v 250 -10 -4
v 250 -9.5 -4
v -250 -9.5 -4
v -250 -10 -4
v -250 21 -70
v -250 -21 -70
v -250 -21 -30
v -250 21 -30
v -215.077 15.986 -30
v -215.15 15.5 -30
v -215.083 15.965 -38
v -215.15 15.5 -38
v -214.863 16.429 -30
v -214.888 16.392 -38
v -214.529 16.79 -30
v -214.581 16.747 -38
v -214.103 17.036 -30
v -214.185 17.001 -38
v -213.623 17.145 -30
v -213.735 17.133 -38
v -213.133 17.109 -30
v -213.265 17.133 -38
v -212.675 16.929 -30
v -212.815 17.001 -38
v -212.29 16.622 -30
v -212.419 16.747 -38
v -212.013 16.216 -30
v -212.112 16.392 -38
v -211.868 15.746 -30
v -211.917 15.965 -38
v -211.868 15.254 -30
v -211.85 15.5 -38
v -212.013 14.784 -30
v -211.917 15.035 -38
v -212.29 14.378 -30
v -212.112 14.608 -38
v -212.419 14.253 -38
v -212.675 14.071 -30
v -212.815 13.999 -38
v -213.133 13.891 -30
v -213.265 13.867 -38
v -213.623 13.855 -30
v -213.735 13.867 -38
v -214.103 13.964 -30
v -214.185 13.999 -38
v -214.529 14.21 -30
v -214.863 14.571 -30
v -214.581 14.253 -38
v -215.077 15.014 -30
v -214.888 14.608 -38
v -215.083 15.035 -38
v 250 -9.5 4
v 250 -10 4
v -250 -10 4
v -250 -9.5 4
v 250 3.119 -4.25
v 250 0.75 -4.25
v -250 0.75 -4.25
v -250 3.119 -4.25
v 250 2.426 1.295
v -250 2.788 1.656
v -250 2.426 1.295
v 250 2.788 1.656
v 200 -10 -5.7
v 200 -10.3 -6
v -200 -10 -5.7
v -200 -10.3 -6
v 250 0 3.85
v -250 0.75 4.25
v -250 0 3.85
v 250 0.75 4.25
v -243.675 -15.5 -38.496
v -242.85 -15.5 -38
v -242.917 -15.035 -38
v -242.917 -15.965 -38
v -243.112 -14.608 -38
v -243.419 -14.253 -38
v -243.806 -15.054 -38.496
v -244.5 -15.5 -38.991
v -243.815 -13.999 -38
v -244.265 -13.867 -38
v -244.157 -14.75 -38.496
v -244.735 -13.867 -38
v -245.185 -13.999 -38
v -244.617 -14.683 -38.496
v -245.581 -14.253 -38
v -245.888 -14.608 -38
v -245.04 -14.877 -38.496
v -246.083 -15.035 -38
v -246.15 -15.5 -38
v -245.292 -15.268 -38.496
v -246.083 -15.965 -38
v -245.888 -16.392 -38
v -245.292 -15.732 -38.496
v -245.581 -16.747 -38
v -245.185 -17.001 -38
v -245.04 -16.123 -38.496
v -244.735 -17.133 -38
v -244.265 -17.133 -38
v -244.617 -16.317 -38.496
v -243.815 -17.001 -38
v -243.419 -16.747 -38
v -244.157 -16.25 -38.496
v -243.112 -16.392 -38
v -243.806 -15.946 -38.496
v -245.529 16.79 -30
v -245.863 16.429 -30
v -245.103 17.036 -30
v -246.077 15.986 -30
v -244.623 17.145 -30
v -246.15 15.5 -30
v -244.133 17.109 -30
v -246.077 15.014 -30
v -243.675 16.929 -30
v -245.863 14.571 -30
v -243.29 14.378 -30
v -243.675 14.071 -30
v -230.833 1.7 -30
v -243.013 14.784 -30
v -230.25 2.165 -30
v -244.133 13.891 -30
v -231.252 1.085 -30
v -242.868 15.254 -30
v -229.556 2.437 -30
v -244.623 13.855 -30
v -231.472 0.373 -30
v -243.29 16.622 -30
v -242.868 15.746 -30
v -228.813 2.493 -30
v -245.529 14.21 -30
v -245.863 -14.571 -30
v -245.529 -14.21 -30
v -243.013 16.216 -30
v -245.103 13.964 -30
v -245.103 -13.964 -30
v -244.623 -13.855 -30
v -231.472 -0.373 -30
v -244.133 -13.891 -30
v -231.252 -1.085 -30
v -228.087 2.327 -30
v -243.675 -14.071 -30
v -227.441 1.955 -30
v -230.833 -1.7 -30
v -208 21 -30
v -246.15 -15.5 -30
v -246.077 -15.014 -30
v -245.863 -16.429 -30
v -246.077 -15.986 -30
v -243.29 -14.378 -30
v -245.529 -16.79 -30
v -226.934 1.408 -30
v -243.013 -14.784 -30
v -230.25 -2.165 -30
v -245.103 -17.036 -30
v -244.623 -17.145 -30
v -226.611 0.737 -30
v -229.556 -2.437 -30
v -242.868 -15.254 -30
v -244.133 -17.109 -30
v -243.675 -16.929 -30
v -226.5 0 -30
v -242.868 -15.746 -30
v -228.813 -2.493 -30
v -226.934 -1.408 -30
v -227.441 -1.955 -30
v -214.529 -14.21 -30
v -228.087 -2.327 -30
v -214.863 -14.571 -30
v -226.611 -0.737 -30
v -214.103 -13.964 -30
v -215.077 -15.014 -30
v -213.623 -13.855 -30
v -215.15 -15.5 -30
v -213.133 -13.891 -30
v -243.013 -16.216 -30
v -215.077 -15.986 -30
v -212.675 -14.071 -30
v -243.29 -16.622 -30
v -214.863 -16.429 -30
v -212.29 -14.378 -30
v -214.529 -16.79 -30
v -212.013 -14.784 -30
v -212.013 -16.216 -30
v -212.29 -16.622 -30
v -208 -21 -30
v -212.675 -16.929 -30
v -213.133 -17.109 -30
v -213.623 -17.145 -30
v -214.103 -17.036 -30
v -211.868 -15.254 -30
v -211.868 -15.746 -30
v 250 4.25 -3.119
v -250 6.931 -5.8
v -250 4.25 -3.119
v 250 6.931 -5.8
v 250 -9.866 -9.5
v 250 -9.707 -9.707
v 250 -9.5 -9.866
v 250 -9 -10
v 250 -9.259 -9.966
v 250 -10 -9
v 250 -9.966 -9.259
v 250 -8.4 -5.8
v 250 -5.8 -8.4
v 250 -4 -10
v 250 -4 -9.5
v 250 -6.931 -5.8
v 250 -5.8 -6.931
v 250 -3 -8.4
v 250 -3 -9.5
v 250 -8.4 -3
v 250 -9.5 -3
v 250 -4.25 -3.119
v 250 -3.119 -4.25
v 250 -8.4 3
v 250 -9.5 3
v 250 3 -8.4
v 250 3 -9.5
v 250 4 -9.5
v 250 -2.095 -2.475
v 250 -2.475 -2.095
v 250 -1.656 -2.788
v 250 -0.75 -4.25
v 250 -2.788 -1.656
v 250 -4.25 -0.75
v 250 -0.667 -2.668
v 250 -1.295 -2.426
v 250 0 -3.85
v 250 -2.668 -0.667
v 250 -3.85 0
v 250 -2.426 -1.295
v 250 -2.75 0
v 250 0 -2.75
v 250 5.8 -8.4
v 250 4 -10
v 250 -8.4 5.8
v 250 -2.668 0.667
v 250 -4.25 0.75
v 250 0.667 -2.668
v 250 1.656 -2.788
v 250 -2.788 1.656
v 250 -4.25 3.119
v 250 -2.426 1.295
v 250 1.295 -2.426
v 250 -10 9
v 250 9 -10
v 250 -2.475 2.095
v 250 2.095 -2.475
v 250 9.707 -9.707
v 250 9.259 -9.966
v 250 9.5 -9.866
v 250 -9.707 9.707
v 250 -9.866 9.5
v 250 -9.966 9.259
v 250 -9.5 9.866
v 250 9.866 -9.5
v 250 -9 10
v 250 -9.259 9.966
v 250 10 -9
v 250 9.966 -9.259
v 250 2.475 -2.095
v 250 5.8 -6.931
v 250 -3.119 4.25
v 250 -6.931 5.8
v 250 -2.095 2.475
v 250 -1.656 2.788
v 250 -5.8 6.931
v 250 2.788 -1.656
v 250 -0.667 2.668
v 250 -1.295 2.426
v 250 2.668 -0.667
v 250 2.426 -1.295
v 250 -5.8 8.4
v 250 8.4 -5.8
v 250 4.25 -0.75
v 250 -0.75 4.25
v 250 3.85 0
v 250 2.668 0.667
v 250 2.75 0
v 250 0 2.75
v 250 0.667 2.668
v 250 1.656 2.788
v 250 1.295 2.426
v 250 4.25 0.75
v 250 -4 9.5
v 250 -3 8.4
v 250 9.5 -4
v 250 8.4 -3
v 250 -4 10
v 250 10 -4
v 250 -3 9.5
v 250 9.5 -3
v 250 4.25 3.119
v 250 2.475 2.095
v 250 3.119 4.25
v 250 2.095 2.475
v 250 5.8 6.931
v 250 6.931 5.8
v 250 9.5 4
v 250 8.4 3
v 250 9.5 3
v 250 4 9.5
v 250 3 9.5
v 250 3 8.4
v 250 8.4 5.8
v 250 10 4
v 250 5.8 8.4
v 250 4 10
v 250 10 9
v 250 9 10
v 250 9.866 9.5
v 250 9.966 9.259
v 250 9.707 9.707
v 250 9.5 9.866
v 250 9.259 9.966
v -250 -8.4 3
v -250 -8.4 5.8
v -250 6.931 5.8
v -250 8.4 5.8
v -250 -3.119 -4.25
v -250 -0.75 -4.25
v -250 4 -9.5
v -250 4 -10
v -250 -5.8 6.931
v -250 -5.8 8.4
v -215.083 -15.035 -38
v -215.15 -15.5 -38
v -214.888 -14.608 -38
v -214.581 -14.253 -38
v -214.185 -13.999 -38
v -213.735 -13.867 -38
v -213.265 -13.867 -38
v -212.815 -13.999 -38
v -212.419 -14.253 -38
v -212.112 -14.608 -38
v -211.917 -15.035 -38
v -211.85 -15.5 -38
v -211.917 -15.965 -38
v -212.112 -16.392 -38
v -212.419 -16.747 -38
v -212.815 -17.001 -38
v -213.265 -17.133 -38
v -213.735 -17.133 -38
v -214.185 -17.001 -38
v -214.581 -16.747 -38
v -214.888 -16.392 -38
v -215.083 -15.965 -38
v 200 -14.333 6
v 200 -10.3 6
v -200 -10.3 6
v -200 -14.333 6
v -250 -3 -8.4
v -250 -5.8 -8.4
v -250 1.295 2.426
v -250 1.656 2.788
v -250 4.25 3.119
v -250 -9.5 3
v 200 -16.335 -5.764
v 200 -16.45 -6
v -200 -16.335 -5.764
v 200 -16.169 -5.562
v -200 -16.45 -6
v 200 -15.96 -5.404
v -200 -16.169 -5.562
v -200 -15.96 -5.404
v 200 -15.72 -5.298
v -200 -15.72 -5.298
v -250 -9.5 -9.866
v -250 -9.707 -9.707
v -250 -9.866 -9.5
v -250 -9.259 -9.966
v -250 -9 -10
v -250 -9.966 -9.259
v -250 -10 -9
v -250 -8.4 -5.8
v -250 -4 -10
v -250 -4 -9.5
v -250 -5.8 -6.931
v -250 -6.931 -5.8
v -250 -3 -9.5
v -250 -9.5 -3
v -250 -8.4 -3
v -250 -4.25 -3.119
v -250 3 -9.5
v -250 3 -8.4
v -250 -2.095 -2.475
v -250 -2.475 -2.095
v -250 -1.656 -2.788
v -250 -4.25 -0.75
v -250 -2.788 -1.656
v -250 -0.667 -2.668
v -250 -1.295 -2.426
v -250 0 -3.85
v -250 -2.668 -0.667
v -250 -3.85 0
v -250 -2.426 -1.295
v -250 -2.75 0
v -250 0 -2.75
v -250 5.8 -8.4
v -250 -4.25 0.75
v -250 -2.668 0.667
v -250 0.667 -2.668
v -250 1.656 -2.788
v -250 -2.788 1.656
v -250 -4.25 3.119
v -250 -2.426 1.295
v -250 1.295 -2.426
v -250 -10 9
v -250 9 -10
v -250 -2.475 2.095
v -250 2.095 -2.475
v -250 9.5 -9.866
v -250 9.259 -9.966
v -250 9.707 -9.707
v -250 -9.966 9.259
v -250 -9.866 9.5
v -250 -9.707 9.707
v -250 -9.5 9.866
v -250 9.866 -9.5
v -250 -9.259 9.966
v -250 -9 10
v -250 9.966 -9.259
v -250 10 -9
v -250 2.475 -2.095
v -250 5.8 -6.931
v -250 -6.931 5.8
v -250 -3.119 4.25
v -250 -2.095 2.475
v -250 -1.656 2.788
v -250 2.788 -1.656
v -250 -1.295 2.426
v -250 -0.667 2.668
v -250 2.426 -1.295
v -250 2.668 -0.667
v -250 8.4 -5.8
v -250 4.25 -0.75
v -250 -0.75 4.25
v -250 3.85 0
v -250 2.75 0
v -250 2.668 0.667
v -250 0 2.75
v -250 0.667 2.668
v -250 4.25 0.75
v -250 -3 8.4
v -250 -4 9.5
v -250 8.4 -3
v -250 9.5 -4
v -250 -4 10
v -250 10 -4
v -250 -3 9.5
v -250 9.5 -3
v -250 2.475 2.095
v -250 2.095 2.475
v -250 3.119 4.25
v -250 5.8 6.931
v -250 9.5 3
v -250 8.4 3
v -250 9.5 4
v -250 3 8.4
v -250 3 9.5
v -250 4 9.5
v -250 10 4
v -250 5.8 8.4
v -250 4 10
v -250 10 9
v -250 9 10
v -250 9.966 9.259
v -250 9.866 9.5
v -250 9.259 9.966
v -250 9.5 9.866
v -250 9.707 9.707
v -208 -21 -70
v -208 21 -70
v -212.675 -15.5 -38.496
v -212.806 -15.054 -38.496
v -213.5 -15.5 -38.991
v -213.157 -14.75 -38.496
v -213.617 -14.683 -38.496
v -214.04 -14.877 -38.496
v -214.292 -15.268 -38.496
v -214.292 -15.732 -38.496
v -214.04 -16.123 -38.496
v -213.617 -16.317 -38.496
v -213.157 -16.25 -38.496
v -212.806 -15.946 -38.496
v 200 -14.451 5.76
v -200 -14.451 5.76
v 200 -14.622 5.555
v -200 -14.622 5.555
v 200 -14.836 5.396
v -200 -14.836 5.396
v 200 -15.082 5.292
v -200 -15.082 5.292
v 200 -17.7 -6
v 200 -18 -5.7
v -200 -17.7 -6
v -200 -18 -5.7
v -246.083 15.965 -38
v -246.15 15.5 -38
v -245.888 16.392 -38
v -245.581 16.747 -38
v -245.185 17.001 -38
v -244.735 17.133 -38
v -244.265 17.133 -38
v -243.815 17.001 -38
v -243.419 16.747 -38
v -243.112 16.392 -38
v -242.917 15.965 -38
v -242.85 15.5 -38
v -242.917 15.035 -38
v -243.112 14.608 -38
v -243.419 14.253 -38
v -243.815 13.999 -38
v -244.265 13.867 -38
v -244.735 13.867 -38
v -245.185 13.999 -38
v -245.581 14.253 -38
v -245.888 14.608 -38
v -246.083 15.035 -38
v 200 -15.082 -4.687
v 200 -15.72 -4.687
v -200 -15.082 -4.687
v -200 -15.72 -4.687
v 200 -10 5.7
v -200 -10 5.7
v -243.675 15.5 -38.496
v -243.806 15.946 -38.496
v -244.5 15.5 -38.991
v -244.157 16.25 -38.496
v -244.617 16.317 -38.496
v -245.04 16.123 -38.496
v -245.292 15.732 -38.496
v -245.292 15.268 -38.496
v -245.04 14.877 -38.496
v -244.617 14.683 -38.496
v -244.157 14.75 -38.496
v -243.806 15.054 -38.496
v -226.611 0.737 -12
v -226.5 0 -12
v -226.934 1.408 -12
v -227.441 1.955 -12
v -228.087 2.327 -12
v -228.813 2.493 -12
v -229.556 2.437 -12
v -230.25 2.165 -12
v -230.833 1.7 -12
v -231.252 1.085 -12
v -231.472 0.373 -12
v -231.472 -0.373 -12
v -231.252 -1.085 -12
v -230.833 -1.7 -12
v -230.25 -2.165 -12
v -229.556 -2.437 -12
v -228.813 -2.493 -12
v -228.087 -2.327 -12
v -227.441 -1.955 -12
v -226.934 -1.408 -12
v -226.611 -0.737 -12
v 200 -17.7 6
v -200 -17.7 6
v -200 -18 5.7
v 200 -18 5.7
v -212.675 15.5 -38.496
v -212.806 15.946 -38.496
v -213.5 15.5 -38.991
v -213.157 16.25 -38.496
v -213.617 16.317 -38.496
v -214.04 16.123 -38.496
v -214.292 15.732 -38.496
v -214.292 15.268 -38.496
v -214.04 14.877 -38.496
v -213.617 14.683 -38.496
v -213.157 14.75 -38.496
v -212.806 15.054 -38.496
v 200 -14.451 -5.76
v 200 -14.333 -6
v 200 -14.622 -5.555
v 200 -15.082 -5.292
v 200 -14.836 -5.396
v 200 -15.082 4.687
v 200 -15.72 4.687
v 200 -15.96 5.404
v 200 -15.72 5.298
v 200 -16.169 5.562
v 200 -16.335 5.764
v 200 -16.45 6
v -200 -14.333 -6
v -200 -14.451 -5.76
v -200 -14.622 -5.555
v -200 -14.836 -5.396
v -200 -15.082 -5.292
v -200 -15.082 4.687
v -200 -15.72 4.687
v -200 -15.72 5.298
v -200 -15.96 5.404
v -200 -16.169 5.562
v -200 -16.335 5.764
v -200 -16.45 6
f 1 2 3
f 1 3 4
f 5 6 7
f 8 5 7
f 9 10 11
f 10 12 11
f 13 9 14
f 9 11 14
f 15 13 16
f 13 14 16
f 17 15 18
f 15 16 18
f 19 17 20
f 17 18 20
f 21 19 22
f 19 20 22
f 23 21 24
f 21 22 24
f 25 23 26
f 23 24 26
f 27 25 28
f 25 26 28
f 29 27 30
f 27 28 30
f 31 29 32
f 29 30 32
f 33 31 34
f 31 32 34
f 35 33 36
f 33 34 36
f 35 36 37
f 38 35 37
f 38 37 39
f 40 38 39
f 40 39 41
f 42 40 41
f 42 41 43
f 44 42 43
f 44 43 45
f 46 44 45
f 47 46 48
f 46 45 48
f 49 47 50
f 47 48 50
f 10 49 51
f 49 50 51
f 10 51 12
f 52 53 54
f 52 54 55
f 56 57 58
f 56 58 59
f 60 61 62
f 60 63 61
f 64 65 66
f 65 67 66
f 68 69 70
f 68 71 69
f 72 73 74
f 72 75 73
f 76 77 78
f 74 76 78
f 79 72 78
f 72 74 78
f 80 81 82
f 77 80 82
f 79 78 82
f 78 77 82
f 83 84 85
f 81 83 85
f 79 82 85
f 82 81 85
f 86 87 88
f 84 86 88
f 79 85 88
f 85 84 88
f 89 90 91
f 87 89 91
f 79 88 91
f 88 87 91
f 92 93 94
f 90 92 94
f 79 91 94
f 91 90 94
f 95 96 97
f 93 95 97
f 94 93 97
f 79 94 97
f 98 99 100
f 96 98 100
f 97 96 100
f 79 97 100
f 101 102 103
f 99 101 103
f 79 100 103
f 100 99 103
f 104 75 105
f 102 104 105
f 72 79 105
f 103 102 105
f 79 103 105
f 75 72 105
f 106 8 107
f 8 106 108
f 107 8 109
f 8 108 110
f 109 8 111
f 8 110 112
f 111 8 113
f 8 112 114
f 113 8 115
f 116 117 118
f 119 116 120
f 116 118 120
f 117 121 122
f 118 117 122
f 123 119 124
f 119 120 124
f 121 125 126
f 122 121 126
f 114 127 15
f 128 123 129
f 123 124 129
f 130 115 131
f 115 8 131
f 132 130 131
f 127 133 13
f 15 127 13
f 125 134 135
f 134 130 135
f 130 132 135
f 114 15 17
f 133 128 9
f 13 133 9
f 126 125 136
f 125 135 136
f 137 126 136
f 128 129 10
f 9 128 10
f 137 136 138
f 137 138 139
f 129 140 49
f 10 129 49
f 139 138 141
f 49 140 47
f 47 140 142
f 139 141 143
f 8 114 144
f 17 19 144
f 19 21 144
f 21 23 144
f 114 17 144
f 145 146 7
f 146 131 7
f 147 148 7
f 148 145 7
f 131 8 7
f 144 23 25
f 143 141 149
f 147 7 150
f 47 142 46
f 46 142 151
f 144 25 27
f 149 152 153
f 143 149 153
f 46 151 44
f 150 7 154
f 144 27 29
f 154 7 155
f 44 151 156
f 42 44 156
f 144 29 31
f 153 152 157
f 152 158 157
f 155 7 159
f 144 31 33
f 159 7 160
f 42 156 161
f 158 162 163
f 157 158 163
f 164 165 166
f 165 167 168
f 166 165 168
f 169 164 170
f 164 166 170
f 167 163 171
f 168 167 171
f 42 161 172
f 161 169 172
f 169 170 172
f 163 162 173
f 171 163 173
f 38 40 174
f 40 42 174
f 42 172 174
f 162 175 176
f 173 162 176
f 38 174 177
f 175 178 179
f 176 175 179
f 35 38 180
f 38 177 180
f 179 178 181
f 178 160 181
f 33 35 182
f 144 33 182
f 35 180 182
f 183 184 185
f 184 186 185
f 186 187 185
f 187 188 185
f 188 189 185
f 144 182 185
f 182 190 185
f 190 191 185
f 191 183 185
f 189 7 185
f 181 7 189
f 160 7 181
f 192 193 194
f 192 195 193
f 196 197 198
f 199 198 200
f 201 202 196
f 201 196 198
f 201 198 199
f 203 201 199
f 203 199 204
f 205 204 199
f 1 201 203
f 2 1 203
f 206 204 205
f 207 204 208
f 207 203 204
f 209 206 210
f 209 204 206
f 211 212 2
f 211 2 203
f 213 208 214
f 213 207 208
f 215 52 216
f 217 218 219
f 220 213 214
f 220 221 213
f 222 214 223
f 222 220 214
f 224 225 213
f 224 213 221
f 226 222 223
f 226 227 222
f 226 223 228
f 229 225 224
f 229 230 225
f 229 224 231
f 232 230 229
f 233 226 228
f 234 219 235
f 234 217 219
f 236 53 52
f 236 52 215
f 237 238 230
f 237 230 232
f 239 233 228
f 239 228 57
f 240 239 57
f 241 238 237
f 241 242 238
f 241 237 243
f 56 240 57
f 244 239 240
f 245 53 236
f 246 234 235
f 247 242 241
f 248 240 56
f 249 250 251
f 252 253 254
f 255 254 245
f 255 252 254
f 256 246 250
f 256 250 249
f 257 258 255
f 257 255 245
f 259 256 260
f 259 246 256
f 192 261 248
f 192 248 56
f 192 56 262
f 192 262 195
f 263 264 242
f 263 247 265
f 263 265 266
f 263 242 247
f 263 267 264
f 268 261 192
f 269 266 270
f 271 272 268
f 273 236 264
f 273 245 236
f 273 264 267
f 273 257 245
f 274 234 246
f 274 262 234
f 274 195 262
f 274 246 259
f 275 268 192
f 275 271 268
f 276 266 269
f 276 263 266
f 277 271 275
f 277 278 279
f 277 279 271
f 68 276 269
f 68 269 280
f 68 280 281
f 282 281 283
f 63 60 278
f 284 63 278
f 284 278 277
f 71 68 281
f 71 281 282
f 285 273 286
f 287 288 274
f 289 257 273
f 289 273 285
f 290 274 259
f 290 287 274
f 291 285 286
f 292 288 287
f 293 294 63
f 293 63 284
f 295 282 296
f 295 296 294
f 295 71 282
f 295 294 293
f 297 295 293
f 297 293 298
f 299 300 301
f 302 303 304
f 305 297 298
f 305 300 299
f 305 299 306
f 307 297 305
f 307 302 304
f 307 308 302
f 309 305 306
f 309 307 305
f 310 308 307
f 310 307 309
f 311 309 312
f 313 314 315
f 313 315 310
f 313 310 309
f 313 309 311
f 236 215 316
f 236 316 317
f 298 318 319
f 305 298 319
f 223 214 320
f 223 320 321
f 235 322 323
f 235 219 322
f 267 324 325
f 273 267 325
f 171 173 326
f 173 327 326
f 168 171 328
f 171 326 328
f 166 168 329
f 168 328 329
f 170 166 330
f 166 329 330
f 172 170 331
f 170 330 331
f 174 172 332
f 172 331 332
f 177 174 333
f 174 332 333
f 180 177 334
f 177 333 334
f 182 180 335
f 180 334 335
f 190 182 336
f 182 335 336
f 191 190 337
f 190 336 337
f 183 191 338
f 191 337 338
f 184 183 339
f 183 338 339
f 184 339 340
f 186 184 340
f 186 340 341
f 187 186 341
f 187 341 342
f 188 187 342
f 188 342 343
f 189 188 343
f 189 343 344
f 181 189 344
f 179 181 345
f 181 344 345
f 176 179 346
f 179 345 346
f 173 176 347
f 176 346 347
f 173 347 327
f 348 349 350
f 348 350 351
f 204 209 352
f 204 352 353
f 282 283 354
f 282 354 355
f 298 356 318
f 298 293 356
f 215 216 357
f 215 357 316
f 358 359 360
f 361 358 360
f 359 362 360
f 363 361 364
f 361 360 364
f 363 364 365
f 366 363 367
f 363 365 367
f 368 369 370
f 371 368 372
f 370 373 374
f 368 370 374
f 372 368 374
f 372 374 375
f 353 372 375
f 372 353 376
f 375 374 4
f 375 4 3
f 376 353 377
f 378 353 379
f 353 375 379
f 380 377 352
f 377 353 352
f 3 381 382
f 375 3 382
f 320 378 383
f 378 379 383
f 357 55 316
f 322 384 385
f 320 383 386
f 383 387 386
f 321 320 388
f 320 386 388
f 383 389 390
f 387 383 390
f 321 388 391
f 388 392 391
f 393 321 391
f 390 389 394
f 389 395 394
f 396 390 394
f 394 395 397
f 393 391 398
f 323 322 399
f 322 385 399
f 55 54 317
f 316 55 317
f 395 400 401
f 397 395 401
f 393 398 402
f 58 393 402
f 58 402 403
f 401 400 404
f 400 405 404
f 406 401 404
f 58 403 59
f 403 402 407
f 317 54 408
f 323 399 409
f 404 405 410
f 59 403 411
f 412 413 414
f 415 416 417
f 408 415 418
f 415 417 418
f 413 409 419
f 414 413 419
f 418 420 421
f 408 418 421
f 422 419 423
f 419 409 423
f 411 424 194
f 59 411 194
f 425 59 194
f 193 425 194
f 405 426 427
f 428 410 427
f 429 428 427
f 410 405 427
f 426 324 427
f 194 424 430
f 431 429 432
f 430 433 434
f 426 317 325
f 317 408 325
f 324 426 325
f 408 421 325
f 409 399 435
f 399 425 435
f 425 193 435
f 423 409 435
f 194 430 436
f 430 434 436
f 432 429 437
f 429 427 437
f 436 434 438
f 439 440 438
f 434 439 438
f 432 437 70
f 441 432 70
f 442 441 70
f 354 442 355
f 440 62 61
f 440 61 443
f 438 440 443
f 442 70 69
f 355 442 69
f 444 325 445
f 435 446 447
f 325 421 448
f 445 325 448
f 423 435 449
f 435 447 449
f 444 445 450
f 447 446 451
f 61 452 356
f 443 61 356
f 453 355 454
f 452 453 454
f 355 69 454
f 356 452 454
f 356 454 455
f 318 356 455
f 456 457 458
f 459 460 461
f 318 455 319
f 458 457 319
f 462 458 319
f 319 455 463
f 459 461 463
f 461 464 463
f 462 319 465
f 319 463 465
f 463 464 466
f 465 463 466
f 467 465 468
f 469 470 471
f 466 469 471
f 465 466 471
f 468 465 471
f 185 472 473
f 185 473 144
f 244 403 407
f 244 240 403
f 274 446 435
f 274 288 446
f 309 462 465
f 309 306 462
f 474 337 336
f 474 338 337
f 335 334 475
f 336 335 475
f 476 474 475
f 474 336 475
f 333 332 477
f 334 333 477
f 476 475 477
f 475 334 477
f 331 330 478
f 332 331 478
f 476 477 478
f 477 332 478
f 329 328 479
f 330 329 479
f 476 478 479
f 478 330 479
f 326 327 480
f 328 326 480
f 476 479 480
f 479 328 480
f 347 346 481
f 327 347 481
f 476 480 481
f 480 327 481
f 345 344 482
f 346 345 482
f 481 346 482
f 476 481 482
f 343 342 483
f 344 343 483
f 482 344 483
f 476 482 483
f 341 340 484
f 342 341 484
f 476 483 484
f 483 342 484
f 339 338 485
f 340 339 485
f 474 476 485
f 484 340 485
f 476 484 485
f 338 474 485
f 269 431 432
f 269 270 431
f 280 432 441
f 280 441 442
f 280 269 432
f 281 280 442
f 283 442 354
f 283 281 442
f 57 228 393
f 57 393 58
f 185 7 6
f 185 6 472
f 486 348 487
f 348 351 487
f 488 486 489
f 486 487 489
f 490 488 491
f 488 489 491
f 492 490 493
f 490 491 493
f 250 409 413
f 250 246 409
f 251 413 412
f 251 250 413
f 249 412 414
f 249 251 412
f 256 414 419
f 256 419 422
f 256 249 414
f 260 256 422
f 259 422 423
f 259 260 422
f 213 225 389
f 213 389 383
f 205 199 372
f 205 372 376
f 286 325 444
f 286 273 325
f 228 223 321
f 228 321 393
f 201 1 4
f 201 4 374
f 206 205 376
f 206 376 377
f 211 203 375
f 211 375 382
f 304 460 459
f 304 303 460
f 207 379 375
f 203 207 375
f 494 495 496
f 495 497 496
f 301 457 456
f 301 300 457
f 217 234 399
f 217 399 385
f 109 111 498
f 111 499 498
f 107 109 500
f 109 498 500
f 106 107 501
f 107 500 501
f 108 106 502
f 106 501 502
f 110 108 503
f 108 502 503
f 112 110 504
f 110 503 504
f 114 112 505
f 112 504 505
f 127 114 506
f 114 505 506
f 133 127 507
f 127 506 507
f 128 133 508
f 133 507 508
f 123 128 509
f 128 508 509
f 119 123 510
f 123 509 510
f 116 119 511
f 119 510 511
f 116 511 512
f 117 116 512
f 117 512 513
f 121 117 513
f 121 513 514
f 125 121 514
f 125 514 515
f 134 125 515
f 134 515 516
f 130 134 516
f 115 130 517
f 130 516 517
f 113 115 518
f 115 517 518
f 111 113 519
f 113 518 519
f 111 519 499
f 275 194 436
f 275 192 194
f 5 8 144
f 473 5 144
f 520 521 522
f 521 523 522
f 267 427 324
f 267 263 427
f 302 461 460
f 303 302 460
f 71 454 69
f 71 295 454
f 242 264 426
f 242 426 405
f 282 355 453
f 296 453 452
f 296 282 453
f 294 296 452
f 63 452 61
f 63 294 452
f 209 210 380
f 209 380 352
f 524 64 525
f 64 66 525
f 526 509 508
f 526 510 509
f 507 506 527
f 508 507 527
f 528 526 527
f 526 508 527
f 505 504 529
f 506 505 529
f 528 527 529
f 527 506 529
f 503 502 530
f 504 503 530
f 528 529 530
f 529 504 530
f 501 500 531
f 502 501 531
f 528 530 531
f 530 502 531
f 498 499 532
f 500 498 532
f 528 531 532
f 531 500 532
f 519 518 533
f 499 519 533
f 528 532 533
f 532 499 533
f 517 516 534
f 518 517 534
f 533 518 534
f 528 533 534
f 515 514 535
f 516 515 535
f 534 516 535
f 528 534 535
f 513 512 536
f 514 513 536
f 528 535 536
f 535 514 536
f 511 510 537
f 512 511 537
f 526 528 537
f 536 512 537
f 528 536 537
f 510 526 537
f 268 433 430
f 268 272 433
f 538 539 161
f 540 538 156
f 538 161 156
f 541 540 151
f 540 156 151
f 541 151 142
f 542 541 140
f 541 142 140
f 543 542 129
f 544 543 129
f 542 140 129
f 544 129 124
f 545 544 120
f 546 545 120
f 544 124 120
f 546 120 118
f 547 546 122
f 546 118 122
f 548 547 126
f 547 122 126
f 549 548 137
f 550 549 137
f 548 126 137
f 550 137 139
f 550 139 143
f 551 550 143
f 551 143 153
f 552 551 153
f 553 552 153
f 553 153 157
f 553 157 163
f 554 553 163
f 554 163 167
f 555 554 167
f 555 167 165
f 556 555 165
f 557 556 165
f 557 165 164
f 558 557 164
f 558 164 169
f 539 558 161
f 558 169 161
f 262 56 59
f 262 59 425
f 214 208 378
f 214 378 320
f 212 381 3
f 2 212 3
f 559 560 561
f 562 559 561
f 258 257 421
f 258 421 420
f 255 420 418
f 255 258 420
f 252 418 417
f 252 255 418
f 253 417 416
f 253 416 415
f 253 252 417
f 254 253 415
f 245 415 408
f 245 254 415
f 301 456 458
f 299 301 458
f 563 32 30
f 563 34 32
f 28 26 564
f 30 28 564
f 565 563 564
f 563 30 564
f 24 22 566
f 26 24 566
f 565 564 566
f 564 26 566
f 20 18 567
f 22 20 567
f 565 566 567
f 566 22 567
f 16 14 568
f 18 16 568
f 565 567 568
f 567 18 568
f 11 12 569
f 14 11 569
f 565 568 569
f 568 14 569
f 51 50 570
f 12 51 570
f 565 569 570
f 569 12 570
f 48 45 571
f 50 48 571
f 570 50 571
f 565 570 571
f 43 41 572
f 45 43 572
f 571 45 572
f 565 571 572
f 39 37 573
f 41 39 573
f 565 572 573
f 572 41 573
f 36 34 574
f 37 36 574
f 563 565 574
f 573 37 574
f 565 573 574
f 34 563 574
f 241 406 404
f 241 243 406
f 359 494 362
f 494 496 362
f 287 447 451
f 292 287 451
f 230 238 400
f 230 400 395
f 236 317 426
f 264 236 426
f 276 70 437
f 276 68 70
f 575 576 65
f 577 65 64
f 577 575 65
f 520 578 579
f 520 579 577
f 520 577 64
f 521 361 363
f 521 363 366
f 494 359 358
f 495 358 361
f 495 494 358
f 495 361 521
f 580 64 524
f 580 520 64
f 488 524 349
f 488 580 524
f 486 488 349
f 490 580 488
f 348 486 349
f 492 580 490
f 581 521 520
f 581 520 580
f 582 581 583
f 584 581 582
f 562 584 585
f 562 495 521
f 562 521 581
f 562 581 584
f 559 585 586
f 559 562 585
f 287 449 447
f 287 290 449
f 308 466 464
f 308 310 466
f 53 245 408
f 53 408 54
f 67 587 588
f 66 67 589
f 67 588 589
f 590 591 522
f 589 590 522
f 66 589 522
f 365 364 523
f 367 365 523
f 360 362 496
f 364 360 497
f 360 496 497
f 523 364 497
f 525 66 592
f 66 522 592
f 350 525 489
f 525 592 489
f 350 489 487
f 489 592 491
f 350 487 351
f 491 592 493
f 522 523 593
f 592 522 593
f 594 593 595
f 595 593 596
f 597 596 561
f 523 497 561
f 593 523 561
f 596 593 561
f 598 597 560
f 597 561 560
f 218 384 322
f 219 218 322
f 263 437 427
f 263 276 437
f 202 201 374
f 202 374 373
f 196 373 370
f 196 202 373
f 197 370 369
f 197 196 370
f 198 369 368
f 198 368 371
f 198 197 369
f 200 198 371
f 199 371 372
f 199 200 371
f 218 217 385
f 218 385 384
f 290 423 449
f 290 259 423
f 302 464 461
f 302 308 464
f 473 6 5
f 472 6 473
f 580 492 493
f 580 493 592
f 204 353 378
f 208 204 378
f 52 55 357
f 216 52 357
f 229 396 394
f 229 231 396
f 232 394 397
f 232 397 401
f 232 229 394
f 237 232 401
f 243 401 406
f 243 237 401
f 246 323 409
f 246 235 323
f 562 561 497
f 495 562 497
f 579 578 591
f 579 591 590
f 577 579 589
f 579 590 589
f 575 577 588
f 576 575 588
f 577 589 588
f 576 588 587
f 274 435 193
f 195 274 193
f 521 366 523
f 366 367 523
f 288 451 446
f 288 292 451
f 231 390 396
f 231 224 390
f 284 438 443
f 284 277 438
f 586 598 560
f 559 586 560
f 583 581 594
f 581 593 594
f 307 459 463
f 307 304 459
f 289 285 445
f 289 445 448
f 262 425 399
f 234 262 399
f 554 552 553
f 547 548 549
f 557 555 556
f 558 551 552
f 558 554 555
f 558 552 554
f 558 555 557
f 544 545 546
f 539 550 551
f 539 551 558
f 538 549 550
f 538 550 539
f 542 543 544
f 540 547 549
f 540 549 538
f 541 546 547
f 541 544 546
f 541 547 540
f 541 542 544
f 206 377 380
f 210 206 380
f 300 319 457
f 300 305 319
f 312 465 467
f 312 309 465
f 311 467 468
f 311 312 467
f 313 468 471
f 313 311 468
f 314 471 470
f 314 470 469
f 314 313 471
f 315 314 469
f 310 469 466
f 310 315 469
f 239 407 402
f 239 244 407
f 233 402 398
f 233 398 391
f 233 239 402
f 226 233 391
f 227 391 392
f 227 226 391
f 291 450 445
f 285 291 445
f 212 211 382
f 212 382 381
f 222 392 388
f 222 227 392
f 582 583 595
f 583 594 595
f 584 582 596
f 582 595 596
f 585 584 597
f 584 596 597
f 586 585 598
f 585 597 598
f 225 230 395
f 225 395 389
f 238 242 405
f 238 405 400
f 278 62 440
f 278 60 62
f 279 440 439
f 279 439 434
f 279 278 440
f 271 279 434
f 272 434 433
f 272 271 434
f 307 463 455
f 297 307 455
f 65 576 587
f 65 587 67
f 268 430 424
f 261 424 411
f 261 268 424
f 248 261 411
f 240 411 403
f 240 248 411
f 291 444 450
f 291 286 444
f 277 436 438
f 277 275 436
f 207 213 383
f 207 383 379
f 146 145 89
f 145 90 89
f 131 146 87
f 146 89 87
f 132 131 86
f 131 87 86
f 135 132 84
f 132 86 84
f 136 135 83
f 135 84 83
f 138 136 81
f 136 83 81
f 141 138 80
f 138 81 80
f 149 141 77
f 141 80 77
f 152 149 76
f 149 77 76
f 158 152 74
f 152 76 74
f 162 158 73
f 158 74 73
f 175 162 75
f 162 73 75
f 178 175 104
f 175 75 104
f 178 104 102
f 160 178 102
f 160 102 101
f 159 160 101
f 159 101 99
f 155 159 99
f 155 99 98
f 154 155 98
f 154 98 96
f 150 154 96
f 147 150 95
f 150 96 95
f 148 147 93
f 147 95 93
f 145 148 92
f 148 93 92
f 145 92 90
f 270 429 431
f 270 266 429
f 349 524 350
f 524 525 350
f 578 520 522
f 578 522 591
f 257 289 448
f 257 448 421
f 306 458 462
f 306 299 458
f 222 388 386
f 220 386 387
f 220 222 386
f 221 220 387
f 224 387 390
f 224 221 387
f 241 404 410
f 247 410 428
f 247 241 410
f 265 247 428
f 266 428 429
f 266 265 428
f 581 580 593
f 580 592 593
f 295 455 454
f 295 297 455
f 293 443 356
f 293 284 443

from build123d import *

# Parameters (mm, degrees)
F1_DEPTH       = 250
F1_DEPTH_BACK  = 250
F3_DEPTH       = 10
F3_DEPTH_BACK  = 10
F5_ANGLE       = 90
F7_DEPTH       = 190
F8_DEPTH       = 190
F9_W           = 42
F9_H           = 40
F10_DEPTH      = 21
F10_DEPTH_BACK = 21
F11_R          = 2.5
F12_DEPTH      = 18
F13_D          = 3.3
F13_DEPTH      = 8
F13_TIP        = 0.9914200214


with BuildPart() as f1:
    # F0 (on Right) → F1 (new body, two sides)
    with BuildSketch(Plane.YZ) as f1_sk:
        with BuildLine():
            Line((-3, 9.5), (-4, 9.5))
            Line((-4, 9.5), (-4, 10))
            Line((-4, 10), (-9, 10))
            ThreePointArc((-9, 10), (-9.7071067812, 9.7071067812), (-10, 9))
            Line((-10, 9), (-10, 4))
            Line((-10, 4), (-9.5, 4))
            Line((-9.5, 4), (-9.5, 3))
            Line((-9.5, 3), (-8.4, 3))
            Line((-8.4, 3), (-8.4, 5.8))
            Line((-8.4, 5.8), (-6.9313708499, 5.8))
            Line((-6.9313708499, 5.8), (-4.25, 3.1186291501))
            Line((-4.25, 3.1186291501), (-4.25, 0.75))
            Line((-4.25, 0.75), (-3.85, 0))
            Line((-3.85, 0), (-4.25, -0.75))
            Line((-4.25, -0.75), (-4.25, -3.1186291501))
            Line((-4.25, -3.1186291501), (-6.9313708499, -5.8))
            Line((-6.9313708499, -5.8), (-8.4, -5.8))
            Line((-8.4, -5.8), (-8.4, -3))
            Line((-8.4, -3), (-9.5, -3))
            Line((-9.5, -3), (-9.5, -4))
            Line((-9.5, -4), (-10, -4))
            Line((-10, -4), (-10, -9))
            ThreePointArc((-10, -9), (-9.7071067812, -9.7071067812), (-9, -10))
            Line((-9, -10), (-4, -10))
            Line((-4, -10), (-4, -9.5))
            Line((-4, -9.5), (-3, -9.5))
            Line((-3, -9.5), (-3, -8.4))
            Line((-3, -8.4), (-5.8, -8.4))
            Line((-5.8, -8.4), (-5.8, -6.9313708499))
            Line((-5.8, -6.9313708499), (-3.1186291501, -4.25))
            Line((-3.1186291501, -4.25), (-0.75, -4.25))
            Line((-0.75, -4.25), (0, -3.85))
            Line((0, -3.85), (0.75, -4.25))
            Line((0.75, -4.25), (3.1186291501, -4.25))
            Line((3.1186291501, -4.25), (5.8, -6.9313708499))
            Line((5.8, -6.9313708499), (5.8, -8.4))
            Line((5.8, -8.4), (3, -8.4))
            Line((3, -8.4), (3, -9.5))
            Line((3, -9.5), (4, -9.5))
            Line((4, -9.5), (4, -10))
            Line((4, -10), (9, -10))
            ThreePointArc((9, -10), (9.7071067812, -9.7071067812), (10, -9))
            Line((10, -9), (10, -4))
            Line((10, -4), (9.5, -4))
            Line((9.5, -4), (9.5, -3))
            Line((9.5, -3), (8.4, -3))
            Line((8.4, -3), (8.4, -5.8))
            Line((8.4, -5.8), (6.9313708499, -5.8))
            Line((6.9313708499, -5.8), (4.25, -3.1186291501))
            Line((4.25, -3.1186291501), (4.25, -0.75))
            Line((4.25, -0.75), (3.85, 0))
            Line((3.85, 0), (4.25, 0.75))
            Line((4.25, 0.75), (4.25, 3.1186291501))
            Line((4.25, 3.1186291501), (6.9313708499, 5.8))
            Line((6.9313708499, 5.8), (8.4, 5.8))
            Line((8.4, 5.8), (8.4, 3))
            Line((8.4, 3), (9.5, 3))
            Line((9.5, 3), (9.5, 4))
            Line((9.5, 4), (10, 4))
            Line((10, 4), (10, 9))
            ThreePointArc((10, 9), (9.7071067812, 9.7071067812), (9, 10))
            Line((9, 10), (4, 10))
            Line((4, 10), (4, 9.5))
            Line((4, 9.5), (3, 9.5))
            Line((3, 9.5), (3, 8.4))
            Line((3, 8.4), (5.8, 8.4))
            Line((5.8, 8.4), (5.8, 6.9313708499))
            Line((5.8, 6.9313708499), (3.1186291501, 4.25))
            Line((3.1186291501, 4.25), (0.75, 4.25))
            Line((0.75, 4.25), (0, 3.85))
            Line((0, 3.85), (-0.75, 4.25))
            Line((-0.75, 4.25), (-3.1186291501, 4.25))
            Line((-3.1186291501, 4.25), (-5.8, 6.9313708499))
            Line((-5.8, 6.9313708499), (-5.8, 8.4))
            Line((-5.8, 8.4), (-3, 8.4))
            Line((-3, 8.4), (-3, 9.5))
        make_face()
        with BuildLine():
            Line((1.2947580706, 2.4261289205), (1.6563032137, 2.7876740636))
            ThreePointArc((1.6563032137, 2.7876740636), (2.2926993168, 2.2926993168), (2.7876740636, 1.6563032137))
            Line((2.7876740636, 1.6563032137), (2.4261289205, 1.2947580706))
            ThreePointArc((2.4261289205, 1.2947580706), (2.75, 0), (2.4261289205, -1.2947580706))
            Line((2.4261289205, -1.2947580706), (2.7876740636, -1.6563032137))
            ThreePointArc((2.7876740636, -1.6563032137), (2.2926993168, -2.2926993168), (1.6563032137, -2.7876740636))
            Line((1.6563032137, -2.7876740636), (1.2947580706, -2.4261289205))
            ThreePointArc((1.2947580706, -2.4261289205), (0, -2.75), (-1.2947580706, -2.4261289205))
            Line((-1.2947580706, -2.4261289205), (-1.6563032137, -2.7876740636))
            ThreePointArc((-1.6563032137, -2.7876740636), (-2.2926993168, -2.2926993168), (-2.7876740636, -1.6563032137))
            Line((-2.7876740636, -1.6563032137), (-2.4261289205, -1.2947580706))
            ThreePointArc((-2.4261289205, -1.2947580706), (-2.75, 0), (-2.4261289205, 1.2947580706))
            Line((-2.4261289205, 1.2947580706), (-2.7876740636, 1.6563032137))
            ThreePointArc((-2.7876740636, 1.6563032137), (-2.2926993168, 2.2926993168), (-1.6563032137, 2.7876740636))
            Line((-1.6563032137, 2.7876740636), (-1.2947580706, 2.4261289205))
            ThreePointArc((-1.2947580706, 2.4261289205), (0, 2.75), (1.2947580706, 2.4261289205))
        make_face(mode=Mode.SUBTRACT)
    extrude(amount=F1_DEPTH)
    extrude(f1_sk.sketch, amount=-F1_DEPTH_BACK)


with BuildPart() as f3:
    # F2 (on Right) → F3 (new body, two sides)
    with BuildSketch(Plane.YZ) as f3_sk:
        with BuildLine():
            Line((5.7, 3.1613363109), (-5.7, 3.1613363109))
            Line((-5.7, 3.1613363109), (-6, 2.8613363109))
            Line((-6, 2.8613363109), (-6, 1.6111123248))
            ThreePointArc((-6, 1.6111123248), (-5.5618877209, 1.3301468843), (-5.2979118939, 0.8815928622))
            Line((-5.2979118939, 0.8815928622), (-4.687472904, 0.8815928622))
            Line((-4.687472904, 0.8815928622), (-4.687472904, 0.2435917318))
            Line((-4.687472904, 0.2435917318), (-5.2921717973, 0.2435917318))
            ThreePointArc((-5.2921717973, 0.2435917318), (-5.5549280271, -0.2169986261), (-6, -0.5052610984))
            Line((-6, -0.5052610984), (-6, -4.5386636892))
            Line((-6, -4.5386636892), (-5.7, -4.8386636892))
            Line((-5.7, -4.8386636892), (5.7, -4.8386636892))
            Line((5.7, -4.8386636892), (6, -4.5386636892))
            Line((6, -4.5386636892), (6, -0.5052610984))
            ThreePointArc((6, -0.5052610984), (5.5549280271, -0.2169986261), (5.2921717973, 0.2435917318))
            Line((5.2921717973, 0.2435917318), (4.687472904, 0.2435917318))
            Line((4.687472904, 0.2435917318), (4.687472904, 0.8815928622))
            Line((4.687472904, 0.8815928622), (5.2979118939, 0.8815928622))
            ThreePointArc((5.2979118939, 0.8815928622), (5.5618877209, 1.3301468843), (6, 1.6111123248))
            Line((6, 1.6111123248), (6, 2.8613363109))
            Line((6, 2.8613363109), (5.7, 3.1613363109))
        make_face()
    extrude(amount=F3_DEPTH)
    extrude(f3_sk.sketch, amount=-F3_DEPTH_BACK)


with BuildPart() as f3_1:
    # F5: moved
    add(f3.part.rotate(Axis((16.7408511043, 0, 0), (1, 0, 0)), F5_ANGLE))


with BuildPart() as f3_2:
    # F6: moved
    add(f3_1.part.moved(Location((0, -14.83866, 0))))

    # F7 (add): a face of the model
    f7_faces = [f3_2.faces().sort_by_distance(p)[0] for p in [
        (-10, -13.954065481, 0),
    ]]
    extrude(f7_faces, amount=F7_DEPTH)

    # F8 (add): a face of the model
    f8_faces = [f3_2.faces().sort_by_distance(p)[0] for p in [
        (10, -13.954065481, 0),
    ]]
    extrude(f8_faces, amount=F8_DEPTH)


with BuildPart() as f10:
    # F9 (on Front) → F10 (new body, two sides)
    with BuildSketch(Plane.XZ) as f10_sk:
        with Locations((-229, -50)):
            Rectangle(F9_W, F9_H)
    extrude(amount=F10_DEPTH)
    extrude(f10_sk.sketch, amount=-F10_DEPTH_BACK)

    # F11 (on face) → F12 (join)
    with BuildSketch(Plane.XY.offset(-30)):
        with Locations((-229, 0)):
            Circle(F11_R)
    extrude(amount=F12_DEPTH)

    # F13
    with Locations(Plane.XY.offset(-30)):
        with Locations((-244.5, 15.5), (-244.5, -15.5), (-213.5, -15.5), (-213.5, 15.5)):
            Hole(F13_D / 2, depth=F13_DEPTH)
            with Locations((0, 0, -(F13_DEPTH + F13_TIP / 2))):  # 118° drill point
                Cone(0, F13_D / 2, F13_TIP, mode=Mode.SUBTRACT)


solid = Compound([f1.part, f3_2.part, f10.part])
